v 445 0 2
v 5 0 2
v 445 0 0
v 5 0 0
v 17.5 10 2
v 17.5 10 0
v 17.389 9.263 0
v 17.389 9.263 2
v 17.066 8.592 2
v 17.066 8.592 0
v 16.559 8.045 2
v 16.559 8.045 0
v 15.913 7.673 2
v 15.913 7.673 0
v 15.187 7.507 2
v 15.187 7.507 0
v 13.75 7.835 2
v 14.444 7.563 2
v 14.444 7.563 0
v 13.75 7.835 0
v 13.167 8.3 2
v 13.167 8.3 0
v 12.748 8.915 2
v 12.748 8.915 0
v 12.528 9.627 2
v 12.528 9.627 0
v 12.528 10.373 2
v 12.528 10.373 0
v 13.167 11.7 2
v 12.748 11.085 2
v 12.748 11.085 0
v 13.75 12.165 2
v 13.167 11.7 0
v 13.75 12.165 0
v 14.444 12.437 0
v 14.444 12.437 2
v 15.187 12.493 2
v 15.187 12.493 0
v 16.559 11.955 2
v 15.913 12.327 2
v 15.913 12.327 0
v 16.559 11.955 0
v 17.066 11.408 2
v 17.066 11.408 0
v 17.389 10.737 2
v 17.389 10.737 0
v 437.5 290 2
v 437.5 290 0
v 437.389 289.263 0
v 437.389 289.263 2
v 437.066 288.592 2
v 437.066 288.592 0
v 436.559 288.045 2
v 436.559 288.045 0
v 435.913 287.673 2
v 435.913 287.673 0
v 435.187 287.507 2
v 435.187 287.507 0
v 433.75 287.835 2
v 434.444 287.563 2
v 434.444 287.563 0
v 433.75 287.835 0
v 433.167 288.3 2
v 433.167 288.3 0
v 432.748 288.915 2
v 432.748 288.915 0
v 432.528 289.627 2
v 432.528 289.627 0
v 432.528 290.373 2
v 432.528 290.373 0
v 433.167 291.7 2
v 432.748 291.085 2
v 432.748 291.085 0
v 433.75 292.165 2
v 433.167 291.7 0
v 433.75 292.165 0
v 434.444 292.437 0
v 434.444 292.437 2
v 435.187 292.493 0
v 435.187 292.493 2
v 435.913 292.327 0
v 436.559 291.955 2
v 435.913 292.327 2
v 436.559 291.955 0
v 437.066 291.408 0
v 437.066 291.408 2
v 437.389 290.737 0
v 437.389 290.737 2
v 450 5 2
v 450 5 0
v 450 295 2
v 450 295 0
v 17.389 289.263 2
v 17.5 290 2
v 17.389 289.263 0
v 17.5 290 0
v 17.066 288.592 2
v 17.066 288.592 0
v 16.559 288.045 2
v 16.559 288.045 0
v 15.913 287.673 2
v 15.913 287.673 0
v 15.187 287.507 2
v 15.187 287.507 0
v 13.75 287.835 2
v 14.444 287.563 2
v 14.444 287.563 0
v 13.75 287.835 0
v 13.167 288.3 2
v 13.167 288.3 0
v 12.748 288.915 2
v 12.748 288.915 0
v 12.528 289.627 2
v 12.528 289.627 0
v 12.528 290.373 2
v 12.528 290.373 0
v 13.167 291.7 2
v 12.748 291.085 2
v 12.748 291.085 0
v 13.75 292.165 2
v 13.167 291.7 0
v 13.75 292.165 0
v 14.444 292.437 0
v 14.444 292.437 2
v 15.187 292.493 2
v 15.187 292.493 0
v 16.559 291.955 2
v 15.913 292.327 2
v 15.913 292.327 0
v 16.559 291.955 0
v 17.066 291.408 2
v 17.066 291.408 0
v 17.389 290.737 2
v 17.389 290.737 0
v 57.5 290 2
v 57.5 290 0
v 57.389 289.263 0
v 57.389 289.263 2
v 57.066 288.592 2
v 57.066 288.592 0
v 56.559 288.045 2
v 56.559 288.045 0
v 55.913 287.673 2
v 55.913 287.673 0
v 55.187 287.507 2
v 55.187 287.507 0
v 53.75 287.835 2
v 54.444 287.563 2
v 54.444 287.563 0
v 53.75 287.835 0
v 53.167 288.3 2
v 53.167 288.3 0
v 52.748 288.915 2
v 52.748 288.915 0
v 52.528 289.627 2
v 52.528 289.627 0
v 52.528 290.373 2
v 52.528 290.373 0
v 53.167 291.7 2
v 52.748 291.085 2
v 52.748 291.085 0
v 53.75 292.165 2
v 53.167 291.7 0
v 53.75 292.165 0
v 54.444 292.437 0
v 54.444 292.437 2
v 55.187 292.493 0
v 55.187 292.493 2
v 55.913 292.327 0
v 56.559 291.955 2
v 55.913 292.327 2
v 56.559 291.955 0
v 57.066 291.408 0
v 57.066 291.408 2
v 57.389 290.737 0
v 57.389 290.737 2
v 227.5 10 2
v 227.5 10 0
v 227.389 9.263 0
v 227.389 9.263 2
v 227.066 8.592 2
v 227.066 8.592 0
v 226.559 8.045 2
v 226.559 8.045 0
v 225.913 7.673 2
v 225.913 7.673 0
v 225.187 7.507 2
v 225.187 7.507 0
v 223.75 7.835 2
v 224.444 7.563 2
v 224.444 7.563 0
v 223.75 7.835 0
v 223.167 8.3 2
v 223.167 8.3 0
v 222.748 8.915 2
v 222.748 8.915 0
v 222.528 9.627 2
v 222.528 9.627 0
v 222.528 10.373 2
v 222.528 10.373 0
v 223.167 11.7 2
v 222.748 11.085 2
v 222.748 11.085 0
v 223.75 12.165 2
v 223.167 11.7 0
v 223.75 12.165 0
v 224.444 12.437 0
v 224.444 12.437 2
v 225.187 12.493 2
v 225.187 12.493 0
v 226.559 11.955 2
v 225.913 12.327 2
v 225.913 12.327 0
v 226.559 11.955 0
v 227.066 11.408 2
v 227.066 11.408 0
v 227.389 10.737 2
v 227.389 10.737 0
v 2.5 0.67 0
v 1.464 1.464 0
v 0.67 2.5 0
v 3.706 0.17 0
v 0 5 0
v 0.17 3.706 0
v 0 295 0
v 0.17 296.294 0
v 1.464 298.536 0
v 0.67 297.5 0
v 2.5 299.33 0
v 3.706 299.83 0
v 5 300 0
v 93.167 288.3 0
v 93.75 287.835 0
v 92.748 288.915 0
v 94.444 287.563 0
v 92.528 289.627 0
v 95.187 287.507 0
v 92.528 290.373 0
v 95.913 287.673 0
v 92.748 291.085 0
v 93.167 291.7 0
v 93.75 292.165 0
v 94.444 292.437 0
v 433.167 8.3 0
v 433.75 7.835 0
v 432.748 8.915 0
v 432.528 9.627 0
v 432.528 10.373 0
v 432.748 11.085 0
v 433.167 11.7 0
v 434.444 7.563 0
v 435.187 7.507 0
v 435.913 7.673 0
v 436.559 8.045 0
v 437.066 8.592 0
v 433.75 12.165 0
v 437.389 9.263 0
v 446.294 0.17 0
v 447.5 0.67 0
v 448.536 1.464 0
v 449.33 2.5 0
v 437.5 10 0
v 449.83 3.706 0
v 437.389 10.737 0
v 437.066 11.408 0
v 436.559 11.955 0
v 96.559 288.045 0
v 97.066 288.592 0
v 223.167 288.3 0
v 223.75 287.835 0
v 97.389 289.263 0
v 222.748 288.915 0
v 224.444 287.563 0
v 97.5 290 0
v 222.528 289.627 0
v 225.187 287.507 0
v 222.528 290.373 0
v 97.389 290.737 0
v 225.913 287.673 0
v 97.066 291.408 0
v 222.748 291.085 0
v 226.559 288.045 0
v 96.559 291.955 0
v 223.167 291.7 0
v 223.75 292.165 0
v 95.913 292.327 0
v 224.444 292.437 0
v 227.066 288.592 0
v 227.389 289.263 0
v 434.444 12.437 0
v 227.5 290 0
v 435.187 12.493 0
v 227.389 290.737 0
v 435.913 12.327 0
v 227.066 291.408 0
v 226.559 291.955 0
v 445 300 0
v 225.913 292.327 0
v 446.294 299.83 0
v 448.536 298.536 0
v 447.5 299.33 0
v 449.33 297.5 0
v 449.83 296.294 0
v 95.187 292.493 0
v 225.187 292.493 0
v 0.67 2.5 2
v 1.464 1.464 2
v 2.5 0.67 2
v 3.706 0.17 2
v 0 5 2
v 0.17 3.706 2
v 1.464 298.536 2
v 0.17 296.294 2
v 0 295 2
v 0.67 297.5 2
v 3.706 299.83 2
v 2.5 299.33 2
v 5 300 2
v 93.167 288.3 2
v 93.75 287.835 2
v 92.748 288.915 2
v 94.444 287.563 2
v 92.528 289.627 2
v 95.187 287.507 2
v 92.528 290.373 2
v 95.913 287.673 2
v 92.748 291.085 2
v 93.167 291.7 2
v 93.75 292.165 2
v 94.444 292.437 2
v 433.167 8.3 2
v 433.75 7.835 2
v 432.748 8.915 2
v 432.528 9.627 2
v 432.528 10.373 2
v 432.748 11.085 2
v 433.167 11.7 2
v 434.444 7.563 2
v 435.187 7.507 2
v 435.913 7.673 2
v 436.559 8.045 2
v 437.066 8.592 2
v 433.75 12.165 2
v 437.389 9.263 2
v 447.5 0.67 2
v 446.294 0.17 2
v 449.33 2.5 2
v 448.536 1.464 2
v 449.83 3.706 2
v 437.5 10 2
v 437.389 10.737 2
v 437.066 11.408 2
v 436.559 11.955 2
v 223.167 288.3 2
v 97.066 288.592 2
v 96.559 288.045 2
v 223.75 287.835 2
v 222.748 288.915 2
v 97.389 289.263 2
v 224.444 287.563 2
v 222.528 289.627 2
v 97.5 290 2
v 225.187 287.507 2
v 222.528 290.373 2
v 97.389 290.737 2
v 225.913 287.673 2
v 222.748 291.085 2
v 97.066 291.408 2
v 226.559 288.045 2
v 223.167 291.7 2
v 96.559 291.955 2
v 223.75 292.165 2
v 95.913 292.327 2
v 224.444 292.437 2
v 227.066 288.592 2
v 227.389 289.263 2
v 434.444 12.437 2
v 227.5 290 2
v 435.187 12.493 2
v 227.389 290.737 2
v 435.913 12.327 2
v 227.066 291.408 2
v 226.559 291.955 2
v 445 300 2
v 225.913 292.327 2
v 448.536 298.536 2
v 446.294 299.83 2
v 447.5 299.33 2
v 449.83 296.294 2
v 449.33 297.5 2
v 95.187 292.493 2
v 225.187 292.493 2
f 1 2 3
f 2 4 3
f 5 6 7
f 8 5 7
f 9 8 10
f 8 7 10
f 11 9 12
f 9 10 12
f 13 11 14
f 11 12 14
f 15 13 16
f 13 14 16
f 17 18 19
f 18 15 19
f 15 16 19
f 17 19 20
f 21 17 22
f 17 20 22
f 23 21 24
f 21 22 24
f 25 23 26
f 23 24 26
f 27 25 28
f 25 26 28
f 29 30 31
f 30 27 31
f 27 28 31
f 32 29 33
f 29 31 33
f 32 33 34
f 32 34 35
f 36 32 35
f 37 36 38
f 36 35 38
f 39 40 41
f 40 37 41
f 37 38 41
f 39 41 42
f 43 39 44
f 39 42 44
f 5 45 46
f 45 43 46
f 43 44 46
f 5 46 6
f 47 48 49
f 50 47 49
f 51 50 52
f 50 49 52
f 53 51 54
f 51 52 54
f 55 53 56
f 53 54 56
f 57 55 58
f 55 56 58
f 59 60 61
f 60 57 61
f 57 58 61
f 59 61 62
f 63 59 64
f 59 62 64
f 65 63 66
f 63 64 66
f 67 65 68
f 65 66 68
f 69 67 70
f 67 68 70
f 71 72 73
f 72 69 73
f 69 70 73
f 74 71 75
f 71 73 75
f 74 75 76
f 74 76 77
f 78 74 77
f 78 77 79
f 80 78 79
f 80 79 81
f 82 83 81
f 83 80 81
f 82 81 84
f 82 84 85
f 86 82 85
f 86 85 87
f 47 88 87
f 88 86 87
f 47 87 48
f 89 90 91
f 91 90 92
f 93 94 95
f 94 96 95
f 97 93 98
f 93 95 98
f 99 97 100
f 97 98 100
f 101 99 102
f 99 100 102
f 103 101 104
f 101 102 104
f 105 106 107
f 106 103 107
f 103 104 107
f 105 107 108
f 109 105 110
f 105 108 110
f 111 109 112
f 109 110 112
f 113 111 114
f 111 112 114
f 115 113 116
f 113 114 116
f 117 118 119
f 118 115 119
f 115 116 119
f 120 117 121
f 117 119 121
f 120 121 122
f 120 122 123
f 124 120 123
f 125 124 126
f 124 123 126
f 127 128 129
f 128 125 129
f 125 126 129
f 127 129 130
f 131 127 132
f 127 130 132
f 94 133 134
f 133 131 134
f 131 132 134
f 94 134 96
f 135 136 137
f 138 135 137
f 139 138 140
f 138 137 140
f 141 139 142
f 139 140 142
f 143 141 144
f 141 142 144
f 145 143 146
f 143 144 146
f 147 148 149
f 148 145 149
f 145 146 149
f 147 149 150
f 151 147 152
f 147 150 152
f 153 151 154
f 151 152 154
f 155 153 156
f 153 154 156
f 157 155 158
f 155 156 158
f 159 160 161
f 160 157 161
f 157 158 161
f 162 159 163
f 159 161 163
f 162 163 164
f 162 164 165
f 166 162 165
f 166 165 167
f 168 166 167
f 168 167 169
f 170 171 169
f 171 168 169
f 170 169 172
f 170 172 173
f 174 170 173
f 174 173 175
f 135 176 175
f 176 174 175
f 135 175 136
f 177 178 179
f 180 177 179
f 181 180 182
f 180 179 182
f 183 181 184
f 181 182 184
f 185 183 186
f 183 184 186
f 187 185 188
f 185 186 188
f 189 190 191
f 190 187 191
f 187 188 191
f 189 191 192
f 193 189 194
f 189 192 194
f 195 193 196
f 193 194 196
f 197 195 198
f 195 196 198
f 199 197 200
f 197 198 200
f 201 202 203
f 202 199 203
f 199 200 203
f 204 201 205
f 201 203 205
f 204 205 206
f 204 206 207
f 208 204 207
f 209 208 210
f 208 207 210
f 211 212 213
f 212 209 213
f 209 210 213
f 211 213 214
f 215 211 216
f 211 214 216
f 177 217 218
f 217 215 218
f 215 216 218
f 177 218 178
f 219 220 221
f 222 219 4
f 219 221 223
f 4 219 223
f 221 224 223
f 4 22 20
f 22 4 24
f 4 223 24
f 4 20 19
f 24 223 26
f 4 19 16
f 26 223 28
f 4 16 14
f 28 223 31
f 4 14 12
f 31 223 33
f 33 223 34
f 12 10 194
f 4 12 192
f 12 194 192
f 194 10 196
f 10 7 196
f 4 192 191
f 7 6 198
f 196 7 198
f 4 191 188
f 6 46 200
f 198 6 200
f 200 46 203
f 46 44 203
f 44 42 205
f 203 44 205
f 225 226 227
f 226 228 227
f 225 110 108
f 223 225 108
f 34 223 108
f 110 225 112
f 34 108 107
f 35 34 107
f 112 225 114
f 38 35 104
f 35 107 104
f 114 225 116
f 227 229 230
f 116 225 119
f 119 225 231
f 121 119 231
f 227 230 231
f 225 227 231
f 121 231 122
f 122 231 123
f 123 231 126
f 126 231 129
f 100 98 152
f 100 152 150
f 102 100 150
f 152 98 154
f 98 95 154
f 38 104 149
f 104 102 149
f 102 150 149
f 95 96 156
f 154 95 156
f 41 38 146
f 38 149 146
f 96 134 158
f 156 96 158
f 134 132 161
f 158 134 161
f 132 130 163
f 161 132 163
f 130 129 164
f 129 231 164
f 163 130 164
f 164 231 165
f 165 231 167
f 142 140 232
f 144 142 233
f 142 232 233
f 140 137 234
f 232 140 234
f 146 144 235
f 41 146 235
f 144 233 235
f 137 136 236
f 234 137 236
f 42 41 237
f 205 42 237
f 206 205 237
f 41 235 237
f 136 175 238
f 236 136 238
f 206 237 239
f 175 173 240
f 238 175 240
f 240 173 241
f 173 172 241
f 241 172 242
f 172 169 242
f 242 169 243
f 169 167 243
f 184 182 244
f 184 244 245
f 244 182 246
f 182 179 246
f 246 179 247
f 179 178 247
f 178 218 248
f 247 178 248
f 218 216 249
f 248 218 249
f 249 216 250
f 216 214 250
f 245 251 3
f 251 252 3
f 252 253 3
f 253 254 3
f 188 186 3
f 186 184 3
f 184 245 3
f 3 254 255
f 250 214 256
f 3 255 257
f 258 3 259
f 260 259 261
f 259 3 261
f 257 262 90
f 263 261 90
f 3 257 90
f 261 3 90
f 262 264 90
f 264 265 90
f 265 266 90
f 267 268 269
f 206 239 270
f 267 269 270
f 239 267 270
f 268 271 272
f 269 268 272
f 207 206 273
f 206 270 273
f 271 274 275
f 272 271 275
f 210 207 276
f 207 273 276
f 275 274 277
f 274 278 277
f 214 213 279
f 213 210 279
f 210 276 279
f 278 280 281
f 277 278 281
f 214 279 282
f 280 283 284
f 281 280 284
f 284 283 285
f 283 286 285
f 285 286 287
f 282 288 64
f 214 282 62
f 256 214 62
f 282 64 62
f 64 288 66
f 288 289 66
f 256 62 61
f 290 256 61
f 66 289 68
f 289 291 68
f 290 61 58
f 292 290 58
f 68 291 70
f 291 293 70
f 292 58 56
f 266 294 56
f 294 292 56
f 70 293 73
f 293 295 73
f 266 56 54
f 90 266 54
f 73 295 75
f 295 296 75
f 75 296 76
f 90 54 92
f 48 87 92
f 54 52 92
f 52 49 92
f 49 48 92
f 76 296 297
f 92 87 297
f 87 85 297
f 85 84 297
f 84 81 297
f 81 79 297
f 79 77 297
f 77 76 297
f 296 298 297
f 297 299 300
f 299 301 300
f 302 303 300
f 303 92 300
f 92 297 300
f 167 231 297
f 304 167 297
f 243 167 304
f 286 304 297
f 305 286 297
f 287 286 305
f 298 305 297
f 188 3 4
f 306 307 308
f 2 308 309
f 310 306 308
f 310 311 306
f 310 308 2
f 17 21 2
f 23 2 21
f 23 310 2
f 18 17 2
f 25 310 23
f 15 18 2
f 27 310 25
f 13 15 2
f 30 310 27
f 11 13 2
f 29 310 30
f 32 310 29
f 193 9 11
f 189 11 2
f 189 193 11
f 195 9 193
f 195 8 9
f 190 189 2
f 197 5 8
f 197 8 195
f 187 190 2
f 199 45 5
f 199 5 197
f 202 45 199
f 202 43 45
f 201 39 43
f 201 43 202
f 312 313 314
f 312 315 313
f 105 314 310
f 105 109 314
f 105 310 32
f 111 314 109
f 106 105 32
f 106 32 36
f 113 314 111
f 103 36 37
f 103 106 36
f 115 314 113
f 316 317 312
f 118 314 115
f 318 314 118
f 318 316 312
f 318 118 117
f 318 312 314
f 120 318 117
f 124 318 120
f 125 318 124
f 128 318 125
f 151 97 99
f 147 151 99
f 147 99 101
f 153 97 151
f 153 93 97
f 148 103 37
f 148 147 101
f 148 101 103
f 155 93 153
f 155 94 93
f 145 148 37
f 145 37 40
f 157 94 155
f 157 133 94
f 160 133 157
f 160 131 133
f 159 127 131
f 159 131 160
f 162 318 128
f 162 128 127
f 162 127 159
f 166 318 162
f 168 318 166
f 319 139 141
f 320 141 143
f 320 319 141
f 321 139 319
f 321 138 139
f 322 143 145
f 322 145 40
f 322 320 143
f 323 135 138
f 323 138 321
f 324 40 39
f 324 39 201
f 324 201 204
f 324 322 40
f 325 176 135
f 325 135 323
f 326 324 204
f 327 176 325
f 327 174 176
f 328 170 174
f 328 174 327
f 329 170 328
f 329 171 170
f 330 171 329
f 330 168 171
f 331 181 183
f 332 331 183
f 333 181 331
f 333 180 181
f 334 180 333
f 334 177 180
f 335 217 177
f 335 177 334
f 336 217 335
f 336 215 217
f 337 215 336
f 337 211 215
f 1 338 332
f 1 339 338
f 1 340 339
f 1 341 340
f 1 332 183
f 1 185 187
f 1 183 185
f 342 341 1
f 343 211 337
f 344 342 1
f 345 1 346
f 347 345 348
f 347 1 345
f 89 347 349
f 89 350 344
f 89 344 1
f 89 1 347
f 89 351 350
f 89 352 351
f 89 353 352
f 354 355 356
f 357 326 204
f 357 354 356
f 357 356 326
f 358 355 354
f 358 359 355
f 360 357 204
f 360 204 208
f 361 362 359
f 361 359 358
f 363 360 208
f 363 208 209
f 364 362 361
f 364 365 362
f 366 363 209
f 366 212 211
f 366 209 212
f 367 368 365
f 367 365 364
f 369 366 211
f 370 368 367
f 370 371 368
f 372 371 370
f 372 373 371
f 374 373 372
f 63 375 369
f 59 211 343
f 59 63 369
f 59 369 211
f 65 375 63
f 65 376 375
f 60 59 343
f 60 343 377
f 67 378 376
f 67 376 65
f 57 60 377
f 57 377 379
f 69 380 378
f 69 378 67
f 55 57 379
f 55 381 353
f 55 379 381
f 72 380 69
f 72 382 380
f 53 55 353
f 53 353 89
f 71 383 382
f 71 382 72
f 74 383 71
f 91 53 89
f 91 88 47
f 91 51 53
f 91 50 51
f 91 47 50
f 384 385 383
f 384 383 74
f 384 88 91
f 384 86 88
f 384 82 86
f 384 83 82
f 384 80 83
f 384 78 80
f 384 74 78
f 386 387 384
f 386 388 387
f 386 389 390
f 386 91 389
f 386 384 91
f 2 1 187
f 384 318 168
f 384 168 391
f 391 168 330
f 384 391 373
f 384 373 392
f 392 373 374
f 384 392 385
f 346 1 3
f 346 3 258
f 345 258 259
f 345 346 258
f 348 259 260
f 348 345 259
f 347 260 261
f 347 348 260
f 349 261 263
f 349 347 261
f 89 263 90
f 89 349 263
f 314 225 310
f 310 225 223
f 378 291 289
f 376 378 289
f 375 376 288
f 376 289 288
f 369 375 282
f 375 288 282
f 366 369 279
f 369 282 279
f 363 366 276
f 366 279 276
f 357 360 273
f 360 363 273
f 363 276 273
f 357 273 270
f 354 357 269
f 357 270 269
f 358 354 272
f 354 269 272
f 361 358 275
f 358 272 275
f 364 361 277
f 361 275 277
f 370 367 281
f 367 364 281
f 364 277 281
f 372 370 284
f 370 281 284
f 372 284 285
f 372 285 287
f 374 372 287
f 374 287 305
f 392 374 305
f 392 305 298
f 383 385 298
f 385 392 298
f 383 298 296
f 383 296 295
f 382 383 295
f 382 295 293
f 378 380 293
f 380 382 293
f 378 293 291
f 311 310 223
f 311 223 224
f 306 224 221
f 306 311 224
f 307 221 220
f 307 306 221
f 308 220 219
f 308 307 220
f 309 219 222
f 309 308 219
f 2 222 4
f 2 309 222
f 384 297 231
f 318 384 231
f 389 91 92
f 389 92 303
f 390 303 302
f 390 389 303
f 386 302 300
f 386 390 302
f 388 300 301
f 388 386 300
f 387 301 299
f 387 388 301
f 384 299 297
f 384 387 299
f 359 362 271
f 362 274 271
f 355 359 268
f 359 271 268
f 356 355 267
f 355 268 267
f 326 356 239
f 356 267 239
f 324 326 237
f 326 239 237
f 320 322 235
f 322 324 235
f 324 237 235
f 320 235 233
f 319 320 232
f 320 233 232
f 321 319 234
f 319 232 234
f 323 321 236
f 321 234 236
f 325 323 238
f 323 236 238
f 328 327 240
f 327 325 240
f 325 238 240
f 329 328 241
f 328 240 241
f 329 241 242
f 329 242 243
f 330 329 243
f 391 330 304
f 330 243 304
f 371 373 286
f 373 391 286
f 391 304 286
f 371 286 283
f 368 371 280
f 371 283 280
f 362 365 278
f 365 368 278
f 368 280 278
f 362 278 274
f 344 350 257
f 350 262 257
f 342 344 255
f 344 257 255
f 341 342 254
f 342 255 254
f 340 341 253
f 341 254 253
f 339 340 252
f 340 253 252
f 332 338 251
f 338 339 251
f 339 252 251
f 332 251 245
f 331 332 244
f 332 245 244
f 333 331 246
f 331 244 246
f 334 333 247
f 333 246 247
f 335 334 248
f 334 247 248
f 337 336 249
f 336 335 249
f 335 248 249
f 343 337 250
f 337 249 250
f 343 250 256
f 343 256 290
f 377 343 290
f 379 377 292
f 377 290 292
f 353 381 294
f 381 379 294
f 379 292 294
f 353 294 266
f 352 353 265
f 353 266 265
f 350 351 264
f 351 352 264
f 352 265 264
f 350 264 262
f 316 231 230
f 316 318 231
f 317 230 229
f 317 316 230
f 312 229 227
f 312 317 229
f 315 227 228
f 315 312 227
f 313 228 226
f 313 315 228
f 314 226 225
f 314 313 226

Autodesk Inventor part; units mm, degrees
ref_plane "YZ Plane" through (0, 0, 0) normal (1, 0, 0) x (0, 1, 0)
ref_plane "XZ Plane" through (0, 0, 0) normal (0, 1, 0) x (-1, 0, 0)
ref_plane "XY Plane" through (0, 0, 0) normal (0, 0, 1) x (1, 0, 0)
sketch "スケッチ1" plane through (0, 0, 0) normal (0, 0, 1) x (1, 0, 0)
  line L0 (0, 0) -> (450, 0)
  line L1 (450, 0) -> (450, 300)
  line L2 (450, 300) -> (0, 300)
  line L3 (0, 300) -> (0, 0)
  line L4 (10, 290) -> (440, 290) construction
  line L5 (440, 290) -> (440, 10) construction
  line L6 (440, 10) -> (10, 10) construction
  line L7 (10, 10) -> (10, 290) construction
  circle A0 centre (15, 290) radius 2.5
  circle A1 centre (435, 290) radius 2.5
  circle A2 centre (225, 290) radius 2.5
  circle A3 centre (15, 10) radius 2.5
  circle A4 centre (435, 10) radius 2.5
  line L8 (225, 0) -> (225, 10) construction
  line L9 (225, 287.5) -> (225, 300) construction
  circle A5 centre (225, 10) radius 2.5
  circle A6 centre (55, 290) radius 2.5
  circle A7 centre (95, 290) radius 2.5
  dimension "d0" = 450
  dimension "d1" = 300
  dimension "d2" = 10
  dimension "d3" = 15
  dimension "d4" = 15
  dimension "d5" = 5
  dimension "d9" = 5
  dimension "d10" = 15
  dimension "d12" = 15
  dimension "d16" = 40
  dimension "d17" = 40
extrude "押し出し1" add sketch "スケッチ1" along normal blind 2
fillet "フィレット1" radius 5 4 edges at (450, 0, 1) (450, 300, 1) (0, 0, 1) (0, 300, 1)
properties part number "防水2" material "PET プラスチック"
